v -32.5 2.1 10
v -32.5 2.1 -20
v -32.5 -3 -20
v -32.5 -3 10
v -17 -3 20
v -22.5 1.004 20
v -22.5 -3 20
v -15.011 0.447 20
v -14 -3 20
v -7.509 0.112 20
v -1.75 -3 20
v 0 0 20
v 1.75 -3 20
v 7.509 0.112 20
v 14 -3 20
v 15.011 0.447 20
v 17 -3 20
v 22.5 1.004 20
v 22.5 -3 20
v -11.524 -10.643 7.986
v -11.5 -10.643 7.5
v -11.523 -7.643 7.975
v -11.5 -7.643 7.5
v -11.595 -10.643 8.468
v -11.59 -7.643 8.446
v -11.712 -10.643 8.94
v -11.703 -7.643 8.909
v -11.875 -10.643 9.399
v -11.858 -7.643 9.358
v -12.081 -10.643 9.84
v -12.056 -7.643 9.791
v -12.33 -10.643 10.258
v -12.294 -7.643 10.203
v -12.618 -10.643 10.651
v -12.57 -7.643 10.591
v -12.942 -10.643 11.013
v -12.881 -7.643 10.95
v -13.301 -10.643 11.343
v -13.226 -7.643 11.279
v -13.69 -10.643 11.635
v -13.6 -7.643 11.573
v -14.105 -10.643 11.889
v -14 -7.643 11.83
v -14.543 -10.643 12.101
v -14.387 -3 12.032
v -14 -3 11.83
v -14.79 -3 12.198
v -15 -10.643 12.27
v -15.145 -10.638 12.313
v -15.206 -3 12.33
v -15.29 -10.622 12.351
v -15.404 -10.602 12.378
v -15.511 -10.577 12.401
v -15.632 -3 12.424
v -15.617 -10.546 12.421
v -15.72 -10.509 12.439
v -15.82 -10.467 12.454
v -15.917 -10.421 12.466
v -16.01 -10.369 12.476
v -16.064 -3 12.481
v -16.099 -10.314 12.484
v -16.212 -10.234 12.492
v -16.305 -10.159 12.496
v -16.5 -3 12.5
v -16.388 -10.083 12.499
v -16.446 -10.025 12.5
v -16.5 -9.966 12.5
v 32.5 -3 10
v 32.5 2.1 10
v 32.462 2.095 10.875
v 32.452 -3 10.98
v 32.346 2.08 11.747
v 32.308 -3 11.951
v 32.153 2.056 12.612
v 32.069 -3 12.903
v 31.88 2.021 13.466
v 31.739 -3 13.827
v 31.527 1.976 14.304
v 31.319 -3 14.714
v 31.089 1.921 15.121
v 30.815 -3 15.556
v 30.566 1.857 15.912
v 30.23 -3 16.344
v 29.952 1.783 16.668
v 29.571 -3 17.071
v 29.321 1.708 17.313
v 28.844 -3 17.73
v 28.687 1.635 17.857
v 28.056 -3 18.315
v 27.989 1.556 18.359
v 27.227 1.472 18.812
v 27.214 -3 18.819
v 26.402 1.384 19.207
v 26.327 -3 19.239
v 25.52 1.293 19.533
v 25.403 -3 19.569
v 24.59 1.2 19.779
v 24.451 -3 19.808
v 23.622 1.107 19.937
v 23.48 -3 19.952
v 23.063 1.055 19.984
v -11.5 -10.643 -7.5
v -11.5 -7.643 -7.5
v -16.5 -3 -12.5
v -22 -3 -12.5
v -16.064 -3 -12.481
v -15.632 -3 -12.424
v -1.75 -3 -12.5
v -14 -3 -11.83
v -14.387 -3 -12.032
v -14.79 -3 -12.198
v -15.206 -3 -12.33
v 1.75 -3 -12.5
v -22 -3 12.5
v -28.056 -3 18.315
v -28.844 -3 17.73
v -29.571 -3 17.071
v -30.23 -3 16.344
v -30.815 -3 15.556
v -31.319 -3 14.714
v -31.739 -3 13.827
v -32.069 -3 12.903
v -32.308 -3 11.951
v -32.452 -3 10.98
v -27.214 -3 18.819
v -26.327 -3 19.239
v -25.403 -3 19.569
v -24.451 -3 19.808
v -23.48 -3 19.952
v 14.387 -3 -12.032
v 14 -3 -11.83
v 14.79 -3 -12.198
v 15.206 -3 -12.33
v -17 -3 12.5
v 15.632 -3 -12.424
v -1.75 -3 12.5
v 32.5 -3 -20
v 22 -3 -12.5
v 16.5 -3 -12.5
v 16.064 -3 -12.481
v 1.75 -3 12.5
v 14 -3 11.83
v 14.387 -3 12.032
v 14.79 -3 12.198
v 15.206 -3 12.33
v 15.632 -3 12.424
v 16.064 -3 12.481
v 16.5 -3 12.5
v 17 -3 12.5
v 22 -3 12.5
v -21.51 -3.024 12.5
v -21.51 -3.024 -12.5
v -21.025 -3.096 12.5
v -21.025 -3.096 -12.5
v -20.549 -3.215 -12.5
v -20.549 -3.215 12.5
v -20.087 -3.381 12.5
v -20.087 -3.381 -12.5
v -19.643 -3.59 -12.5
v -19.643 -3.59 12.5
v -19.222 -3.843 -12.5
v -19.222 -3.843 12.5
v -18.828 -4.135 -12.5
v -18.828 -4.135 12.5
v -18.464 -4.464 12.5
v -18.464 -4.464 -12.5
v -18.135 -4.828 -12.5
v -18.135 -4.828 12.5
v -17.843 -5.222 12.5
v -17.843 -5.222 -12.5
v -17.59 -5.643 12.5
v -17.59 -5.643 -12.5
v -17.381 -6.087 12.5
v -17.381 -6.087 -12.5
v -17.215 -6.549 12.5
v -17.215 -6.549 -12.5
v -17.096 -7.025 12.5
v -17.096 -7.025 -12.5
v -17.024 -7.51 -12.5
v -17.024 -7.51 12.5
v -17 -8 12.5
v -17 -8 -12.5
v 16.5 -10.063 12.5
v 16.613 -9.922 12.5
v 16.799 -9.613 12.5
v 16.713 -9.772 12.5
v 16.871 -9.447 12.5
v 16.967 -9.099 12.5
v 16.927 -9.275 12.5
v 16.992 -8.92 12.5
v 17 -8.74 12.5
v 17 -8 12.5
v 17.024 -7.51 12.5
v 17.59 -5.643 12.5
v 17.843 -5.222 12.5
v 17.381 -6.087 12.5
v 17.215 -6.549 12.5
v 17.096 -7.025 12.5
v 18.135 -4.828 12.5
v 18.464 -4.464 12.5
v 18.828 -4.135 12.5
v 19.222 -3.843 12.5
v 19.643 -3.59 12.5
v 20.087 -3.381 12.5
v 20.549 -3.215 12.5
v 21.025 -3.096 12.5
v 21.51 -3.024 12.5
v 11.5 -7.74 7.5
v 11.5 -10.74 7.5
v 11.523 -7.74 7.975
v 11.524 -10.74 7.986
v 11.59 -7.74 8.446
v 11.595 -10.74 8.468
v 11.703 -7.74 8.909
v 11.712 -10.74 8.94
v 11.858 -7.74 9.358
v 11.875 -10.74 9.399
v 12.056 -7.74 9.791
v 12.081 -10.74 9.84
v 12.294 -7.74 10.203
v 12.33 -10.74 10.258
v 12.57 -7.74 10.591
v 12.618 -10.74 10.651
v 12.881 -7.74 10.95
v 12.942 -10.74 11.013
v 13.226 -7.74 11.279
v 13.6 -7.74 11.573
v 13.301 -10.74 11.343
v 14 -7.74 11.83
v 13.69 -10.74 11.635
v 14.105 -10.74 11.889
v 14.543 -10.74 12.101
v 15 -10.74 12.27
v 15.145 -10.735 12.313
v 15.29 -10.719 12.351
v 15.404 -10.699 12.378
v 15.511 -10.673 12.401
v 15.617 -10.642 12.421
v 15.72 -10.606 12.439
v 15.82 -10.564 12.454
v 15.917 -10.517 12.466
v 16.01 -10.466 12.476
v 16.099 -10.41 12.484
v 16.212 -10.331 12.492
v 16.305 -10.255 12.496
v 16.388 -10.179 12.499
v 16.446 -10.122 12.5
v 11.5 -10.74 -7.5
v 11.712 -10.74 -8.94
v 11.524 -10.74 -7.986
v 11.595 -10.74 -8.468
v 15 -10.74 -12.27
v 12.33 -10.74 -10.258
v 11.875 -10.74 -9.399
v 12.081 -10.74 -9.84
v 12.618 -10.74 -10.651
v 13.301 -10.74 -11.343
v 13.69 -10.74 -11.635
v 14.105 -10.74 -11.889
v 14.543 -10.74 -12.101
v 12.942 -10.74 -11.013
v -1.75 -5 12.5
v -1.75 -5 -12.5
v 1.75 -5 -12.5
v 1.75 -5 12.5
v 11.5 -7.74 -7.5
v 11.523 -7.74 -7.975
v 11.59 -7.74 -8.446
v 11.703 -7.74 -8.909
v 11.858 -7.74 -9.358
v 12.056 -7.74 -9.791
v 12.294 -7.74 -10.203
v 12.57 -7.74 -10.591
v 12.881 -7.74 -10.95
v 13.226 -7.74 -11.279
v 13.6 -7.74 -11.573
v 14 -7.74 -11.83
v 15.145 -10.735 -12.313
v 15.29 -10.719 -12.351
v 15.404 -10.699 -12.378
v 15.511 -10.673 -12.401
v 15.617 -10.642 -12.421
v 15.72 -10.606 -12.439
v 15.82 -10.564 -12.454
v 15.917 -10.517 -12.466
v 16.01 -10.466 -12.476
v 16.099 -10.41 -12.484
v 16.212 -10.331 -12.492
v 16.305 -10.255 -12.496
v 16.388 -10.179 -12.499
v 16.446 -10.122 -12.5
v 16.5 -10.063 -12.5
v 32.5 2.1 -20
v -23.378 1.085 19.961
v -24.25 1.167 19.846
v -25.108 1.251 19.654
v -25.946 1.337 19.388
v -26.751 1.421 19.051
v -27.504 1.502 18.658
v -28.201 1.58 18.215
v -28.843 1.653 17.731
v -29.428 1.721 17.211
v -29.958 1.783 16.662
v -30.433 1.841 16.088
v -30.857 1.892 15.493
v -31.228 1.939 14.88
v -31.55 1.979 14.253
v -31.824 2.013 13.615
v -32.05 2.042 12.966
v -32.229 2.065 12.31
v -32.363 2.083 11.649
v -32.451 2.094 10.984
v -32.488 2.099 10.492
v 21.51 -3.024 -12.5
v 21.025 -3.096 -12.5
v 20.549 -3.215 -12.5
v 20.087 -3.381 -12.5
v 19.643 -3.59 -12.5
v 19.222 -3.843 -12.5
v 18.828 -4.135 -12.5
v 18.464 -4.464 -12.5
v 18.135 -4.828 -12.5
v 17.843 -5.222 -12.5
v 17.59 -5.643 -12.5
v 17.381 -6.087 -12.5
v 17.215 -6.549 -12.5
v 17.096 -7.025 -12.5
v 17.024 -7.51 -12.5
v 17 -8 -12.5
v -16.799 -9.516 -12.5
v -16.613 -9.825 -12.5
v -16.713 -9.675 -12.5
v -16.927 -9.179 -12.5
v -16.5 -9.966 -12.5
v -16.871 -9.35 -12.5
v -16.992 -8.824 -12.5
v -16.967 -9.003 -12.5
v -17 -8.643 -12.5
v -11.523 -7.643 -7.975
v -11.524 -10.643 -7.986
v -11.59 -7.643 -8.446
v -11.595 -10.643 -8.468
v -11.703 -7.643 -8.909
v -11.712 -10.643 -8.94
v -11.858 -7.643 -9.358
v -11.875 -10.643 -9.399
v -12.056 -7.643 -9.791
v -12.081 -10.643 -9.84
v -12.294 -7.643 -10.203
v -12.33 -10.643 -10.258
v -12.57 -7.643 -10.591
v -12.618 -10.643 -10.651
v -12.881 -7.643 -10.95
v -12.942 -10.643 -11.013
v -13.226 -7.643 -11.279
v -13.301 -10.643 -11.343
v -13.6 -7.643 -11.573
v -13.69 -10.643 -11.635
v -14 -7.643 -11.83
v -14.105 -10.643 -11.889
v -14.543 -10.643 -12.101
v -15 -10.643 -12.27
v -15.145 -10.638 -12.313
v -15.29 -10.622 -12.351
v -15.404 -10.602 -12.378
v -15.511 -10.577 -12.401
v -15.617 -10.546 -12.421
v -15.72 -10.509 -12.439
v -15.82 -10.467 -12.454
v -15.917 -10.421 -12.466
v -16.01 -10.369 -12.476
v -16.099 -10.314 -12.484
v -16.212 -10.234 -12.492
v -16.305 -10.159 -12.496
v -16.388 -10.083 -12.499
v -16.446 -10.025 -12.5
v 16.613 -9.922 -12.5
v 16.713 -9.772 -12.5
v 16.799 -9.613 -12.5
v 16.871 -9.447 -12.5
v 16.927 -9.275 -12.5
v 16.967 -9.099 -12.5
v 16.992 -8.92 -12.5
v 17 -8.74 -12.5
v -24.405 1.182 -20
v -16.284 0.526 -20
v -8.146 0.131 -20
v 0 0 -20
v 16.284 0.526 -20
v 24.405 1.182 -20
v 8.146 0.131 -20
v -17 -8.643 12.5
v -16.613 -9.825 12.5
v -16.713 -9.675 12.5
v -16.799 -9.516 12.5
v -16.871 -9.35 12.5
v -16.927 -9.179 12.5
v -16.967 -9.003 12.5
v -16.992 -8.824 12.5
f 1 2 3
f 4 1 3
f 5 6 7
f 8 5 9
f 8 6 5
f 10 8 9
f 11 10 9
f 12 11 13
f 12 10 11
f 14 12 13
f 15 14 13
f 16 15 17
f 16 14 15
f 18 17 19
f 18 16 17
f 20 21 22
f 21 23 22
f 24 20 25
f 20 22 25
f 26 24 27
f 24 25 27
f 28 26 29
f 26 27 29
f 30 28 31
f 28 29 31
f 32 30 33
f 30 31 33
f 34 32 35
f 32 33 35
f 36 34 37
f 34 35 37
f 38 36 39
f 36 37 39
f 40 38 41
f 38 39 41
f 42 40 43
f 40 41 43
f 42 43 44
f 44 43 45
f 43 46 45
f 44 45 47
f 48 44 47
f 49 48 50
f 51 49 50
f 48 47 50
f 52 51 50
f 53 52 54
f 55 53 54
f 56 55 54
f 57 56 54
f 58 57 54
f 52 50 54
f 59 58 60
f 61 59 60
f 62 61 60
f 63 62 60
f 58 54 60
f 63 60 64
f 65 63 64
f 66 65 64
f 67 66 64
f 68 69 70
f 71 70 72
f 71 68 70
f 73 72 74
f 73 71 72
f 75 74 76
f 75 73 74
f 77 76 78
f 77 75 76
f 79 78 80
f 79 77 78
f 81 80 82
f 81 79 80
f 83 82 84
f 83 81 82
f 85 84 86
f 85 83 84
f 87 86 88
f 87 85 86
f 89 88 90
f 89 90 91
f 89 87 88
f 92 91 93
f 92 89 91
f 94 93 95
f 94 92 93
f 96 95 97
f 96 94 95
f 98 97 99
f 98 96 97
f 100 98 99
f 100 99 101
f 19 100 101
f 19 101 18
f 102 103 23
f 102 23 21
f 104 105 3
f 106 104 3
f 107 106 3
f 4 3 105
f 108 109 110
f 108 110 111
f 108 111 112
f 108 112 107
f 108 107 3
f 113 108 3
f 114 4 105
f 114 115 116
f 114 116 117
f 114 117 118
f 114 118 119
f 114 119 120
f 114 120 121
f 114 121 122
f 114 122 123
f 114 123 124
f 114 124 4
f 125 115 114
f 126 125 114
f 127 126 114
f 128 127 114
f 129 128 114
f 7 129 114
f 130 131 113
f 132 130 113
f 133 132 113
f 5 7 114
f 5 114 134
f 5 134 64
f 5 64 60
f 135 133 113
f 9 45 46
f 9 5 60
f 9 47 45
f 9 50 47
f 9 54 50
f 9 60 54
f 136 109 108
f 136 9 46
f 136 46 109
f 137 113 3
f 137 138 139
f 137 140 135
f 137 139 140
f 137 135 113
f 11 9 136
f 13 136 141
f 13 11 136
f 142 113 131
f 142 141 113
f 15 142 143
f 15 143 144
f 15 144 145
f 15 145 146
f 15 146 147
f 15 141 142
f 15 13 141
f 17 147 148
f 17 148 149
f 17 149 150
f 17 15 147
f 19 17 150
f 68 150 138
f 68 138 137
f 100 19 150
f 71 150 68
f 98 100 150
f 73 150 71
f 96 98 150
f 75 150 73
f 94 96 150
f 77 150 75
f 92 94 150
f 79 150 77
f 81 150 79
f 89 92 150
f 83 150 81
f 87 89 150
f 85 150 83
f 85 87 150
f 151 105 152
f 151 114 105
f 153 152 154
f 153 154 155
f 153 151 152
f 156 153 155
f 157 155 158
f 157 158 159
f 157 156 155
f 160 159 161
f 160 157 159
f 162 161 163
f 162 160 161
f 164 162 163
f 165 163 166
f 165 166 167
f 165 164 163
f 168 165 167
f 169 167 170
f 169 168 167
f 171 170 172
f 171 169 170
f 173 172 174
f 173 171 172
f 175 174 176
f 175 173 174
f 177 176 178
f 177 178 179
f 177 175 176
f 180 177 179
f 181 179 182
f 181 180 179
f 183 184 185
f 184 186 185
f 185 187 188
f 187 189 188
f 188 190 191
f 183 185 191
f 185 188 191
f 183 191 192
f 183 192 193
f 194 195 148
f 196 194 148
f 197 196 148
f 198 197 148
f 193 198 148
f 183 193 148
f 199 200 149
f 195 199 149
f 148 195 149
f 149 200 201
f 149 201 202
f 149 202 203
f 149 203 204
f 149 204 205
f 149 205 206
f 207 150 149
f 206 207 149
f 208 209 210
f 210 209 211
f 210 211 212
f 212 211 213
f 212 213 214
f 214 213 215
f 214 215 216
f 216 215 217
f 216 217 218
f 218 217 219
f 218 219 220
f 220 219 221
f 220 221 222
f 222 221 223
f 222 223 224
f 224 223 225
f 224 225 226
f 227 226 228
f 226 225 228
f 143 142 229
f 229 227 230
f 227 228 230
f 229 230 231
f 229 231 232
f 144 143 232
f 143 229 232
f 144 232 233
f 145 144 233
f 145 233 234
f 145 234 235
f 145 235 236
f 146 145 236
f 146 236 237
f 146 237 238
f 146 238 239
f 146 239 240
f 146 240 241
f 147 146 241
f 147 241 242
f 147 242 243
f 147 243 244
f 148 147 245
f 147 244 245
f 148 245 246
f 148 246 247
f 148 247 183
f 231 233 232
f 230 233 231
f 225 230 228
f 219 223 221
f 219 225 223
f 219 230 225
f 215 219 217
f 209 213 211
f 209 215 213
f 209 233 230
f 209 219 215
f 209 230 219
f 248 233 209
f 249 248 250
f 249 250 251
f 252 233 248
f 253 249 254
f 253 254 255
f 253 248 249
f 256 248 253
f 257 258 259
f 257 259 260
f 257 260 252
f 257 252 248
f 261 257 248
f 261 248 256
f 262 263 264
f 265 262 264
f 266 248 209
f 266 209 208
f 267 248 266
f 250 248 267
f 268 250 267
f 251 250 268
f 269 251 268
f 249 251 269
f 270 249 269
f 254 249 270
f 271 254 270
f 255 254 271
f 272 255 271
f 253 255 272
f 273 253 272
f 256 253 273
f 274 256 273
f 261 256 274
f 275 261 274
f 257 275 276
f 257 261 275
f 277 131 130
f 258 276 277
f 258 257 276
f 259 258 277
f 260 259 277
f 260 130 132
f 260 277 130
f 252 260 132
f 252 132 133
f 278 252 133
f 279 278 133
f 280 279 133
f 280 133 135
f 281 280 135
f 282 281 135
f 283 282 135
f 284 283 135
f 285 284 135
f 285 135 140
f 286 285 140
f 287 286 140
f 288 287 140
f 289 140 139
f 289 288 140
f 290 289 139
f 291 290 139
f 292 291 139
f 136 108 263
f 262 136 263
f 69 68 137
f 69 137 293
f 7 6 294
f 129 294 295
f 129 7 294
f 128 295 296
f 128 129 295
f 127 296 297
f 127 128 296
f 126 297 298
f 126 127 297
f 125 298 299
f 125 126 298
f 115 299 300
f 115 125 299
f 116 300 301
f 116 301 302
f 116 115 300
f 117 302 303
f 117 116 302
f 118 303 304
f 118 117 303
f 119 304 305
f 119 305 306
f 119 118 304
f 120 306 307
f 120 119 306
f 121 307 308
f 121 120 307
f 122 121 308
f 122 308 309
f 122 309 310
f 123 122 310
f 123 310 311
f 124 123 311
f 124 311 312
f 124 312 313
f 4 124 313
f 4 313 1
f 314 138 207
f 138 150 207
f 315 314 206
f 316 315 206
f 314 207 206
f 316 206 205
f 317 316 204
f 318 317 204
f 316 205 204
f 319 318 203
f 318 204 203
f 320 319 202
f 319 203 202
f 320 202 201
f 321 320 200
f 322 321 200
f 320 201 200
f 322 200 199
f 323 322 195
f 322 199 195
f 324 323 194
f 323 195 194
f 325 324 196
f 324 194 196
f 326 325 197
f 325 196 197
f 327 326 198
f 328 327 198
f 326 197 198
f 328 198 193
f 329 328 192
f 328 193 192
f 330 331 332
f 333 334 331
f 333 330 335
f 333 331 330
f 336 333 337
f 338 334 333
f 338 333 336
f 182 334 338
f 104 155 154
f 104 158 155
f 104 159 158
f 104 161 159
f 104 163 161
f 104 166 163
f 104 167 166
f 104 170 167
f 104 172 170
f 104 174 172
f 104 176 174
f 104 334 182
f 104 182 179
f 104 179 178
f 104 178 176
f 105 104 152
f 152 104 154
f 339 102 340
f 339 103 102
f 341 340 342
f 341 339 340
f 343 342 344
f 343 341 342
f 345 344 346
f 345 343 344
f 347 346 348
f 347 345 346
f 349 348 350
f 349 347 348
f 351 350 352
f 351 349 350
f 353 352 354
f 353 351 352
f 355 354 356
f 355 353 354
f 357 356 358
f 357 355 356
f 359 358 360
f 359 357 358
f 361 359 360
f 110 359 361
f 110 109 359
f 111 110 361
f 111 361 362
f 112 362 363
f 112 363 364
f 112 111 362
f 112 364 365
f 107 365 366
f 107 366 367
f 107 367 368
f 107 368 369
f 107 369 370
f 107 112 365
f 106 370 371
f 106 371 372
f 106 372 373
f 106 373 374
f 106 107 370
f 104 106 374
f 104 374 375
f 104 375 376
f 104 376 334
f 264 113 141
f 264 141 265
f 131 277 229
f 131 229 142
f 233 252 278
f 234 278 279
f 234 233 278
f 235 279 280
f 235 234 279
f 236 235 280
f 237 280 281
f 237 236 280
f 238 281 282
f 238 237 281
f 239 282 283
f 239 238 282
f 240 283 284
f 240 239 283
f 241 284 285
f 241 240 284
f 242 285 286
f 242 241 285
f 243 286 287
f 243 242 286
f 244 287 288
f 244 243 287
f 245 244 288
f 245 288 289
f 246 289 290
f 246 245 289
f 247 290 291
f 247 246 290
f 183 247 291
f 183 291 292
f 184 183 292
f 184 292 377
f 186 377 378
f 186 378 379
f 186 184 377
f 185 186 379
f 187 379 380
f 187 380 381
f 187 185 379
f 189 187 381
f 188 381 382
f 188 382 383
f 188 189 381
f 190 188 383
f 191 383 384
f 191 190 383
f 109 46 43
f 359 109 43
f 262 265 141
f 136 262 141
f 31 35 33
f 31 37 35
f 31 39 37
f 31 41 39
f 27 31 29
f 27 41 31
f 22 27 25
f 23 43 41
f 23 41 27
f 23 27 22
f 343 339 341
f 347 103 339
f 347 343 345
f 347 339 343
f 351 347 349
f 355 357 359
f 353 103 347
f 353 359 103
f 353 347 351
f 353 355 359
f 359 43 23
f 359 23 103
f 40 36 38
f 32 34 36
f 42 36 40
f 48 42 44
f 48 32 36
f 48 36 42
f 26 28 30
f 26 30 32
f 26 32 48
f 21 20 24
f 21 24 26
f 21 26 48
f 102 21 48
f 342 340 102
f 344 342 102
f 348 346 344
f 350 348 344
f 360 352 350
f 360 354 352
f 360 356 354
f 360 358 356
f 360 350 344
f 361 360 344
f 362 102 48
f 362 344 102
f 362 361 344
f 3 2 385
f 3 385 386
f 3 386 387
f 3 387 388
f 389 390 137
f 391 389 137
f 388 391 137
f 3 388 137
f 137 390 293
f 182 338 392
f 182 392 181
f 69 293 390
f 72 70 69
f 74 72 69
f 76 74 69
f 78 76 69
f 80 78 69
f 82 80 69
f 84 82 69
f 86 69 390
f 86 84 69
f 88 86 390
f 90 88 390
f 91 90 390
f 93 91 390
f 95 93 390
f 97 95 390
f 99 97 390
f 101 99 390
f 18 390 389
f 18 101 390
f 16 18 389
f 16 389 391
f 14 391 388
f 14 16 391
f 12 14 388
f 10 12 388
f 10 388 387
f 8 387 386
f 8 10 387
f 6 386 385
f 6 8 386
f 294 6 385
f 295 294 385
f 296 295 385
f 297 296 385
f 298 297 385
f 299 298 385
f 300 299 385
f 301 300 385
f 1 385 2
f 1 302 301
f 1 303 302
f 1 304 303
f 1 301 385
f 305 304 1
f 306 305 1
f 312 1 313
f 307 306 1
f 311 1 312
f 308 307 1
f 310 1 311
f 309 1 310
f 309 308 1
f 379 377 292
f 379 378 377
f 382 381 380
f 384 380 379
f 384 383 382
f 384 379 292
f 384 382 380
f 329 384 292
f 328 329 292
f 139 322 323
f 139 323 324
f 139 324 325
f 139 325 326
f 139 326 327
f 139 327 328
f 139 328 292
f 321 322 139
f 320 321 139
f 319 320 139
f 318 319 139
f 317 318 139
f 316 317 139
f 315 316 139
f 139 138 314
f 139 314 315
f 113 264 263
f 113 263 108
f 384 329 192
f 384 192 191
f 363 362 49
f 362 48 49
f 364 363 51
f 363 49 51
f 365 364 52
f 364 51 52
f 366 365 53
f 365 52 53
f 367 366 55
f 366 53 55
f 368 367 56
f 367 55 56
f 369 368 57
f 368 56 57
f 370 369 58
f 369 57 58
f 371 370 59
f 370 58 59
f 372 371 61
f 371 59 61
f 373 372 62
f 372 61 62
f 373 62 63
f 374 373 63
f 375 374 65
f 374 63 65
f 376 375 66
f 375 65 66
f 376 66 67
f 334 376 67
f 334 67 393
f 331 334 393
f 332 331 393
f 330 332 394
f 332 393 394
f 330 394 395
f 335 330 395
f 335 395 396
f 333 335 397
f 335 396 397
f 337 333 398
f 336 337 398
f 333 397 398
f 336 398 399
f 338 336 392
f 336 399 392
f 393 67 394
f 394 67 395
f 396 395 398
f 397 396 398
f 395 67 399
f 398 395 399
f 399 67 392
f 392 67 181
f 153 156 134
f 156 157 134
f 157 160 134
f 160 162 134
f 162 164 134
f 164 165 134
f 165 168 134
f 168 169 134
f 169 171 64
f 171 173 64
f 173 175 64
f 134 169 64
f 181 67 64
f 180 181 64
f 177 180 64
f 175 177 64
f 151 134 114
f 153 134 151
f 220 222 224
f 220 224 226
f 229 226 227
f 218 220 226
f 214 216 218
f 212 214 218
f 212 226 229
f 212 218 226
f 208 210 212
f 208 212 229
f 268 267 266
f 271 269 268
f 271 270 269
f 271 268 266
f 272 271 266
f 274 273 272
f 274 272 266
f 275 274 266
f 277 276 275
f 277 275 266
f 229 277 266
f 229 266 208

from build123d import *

# Parameters (mm, degrees)
F0_W     = 65
F0_H     = 40
F1_DEPTH = 3
F3_DEPTH = 40
F4_W     = 3.5
F4_H     = 2
F5_DEPTH = 40
F6_W     = 10.0229219794
F6_H     = 7.5
F6_W_2   = 13.6237391531
F7_DEPTH = 65
F8_R     = 5
F9_R     = 5
F10_R    = 2
F11_R    = 10


with BuildPart() as f1:
    # F0 (on Front) → F1 (new body)
    with BuildSketch(Plane.XZ):
        Rectangle(F0_W, F0_H)
    extrude(amount=F1_DEPTH)

    # F2 (on face) → F3 (join, through all)
    with BuildSketch(Plane.XY.offset(20)):
        with BuildLine():
            ThreePointArc((32.5, 2.100319489), (16.2838980434, 0.5256269687), (0, 0))
            Line((0, 0), (32.5, 0))
            Line((32.5, 0), (32.5, 2.100319489))
        make_face()
        with BuildLine():
            ThreePointArc((0, 0), (-16.2838980434, 0.5256269687), (-32.5, 2.100319489))
            Line((-32.5, 2.100319489), (-32.5, 0))
            Line((-32.5, 0), (0, 0))
        make_face()
    extrude(amount=-F3_DEPTH)

    # F4 (on face) → F5 (join, through all)
    with BuildSketch(Plane(origin=(0, 0, -20), x_dir=(1, 0, 0), z_dir=(0, 0, -1))):
        Polygon((-17, 10.6432288885), (-17, 3), (-14, 3), (-14, 7.6432288885), (-11.5, 7.6432288885), (-11.5, 10.6432288885), align=None)
        Polygon((14, 3), (17, 3), (17, 10.7397525311), (11.5, 10.7397525311), (11.5, 7.7397525311), (14, 7.7397525311), align=None)
        with Locations((0, 4)):
            Rectangle(F4_W, F4_H)
    extrude(amount=-F5_DEPTH)

    # F6 (on face) → F7 (cut, through all)
    with BuildSketch(Plane.YZ.offset(32.5)):
        with Locations((-8.0114609897, -16.25)):
            Rectangle(F6_W, F6_H)
        with Locations((-9.8118695766, 16.25)):
            Rectangle(F6_W_2, F6_H)
    extrude(amount=-F7_DEPTH, mode=Mode.SUBTRACT)

    # F8
    f8_edges = [f1.edges().sort_by_distance(p)[0] for p in [
        (17, -3, 0),
        (-17, -3, 0),
    ]]
    fillet(f8_edges, radius=F8_R)

    # F9
    f9_edges = [f1.edges().sort_by_distance(p)[0] for p in [
        (11.5, -9.239753, 12.5),
        (-11.5, -9.143229, 12.5),
        (11.5, -9.239753, -12.5),
        (-11.5, -9.143229, -12.5),
    ]]
    fillet(f9_edges, radius=F9_R)

    # F10
    f10_edges = [f1.edges().sort_by_distance(p)[0] for p in [
        (17, -10.739753, 0),
        (-17, -10.643229, 0),
    ]]
    fillet(f10_edges, radius=F10_R)

    # F11
    f11_edges = [f1.edges().sort_by_distance(p)[0] for p in [
        (32.5, -0.44984, 20),
        (-32.5, -0.44984, 20),
    ]]
    fillet(f11_edges, radius=F11_R)


solid = f1.part
